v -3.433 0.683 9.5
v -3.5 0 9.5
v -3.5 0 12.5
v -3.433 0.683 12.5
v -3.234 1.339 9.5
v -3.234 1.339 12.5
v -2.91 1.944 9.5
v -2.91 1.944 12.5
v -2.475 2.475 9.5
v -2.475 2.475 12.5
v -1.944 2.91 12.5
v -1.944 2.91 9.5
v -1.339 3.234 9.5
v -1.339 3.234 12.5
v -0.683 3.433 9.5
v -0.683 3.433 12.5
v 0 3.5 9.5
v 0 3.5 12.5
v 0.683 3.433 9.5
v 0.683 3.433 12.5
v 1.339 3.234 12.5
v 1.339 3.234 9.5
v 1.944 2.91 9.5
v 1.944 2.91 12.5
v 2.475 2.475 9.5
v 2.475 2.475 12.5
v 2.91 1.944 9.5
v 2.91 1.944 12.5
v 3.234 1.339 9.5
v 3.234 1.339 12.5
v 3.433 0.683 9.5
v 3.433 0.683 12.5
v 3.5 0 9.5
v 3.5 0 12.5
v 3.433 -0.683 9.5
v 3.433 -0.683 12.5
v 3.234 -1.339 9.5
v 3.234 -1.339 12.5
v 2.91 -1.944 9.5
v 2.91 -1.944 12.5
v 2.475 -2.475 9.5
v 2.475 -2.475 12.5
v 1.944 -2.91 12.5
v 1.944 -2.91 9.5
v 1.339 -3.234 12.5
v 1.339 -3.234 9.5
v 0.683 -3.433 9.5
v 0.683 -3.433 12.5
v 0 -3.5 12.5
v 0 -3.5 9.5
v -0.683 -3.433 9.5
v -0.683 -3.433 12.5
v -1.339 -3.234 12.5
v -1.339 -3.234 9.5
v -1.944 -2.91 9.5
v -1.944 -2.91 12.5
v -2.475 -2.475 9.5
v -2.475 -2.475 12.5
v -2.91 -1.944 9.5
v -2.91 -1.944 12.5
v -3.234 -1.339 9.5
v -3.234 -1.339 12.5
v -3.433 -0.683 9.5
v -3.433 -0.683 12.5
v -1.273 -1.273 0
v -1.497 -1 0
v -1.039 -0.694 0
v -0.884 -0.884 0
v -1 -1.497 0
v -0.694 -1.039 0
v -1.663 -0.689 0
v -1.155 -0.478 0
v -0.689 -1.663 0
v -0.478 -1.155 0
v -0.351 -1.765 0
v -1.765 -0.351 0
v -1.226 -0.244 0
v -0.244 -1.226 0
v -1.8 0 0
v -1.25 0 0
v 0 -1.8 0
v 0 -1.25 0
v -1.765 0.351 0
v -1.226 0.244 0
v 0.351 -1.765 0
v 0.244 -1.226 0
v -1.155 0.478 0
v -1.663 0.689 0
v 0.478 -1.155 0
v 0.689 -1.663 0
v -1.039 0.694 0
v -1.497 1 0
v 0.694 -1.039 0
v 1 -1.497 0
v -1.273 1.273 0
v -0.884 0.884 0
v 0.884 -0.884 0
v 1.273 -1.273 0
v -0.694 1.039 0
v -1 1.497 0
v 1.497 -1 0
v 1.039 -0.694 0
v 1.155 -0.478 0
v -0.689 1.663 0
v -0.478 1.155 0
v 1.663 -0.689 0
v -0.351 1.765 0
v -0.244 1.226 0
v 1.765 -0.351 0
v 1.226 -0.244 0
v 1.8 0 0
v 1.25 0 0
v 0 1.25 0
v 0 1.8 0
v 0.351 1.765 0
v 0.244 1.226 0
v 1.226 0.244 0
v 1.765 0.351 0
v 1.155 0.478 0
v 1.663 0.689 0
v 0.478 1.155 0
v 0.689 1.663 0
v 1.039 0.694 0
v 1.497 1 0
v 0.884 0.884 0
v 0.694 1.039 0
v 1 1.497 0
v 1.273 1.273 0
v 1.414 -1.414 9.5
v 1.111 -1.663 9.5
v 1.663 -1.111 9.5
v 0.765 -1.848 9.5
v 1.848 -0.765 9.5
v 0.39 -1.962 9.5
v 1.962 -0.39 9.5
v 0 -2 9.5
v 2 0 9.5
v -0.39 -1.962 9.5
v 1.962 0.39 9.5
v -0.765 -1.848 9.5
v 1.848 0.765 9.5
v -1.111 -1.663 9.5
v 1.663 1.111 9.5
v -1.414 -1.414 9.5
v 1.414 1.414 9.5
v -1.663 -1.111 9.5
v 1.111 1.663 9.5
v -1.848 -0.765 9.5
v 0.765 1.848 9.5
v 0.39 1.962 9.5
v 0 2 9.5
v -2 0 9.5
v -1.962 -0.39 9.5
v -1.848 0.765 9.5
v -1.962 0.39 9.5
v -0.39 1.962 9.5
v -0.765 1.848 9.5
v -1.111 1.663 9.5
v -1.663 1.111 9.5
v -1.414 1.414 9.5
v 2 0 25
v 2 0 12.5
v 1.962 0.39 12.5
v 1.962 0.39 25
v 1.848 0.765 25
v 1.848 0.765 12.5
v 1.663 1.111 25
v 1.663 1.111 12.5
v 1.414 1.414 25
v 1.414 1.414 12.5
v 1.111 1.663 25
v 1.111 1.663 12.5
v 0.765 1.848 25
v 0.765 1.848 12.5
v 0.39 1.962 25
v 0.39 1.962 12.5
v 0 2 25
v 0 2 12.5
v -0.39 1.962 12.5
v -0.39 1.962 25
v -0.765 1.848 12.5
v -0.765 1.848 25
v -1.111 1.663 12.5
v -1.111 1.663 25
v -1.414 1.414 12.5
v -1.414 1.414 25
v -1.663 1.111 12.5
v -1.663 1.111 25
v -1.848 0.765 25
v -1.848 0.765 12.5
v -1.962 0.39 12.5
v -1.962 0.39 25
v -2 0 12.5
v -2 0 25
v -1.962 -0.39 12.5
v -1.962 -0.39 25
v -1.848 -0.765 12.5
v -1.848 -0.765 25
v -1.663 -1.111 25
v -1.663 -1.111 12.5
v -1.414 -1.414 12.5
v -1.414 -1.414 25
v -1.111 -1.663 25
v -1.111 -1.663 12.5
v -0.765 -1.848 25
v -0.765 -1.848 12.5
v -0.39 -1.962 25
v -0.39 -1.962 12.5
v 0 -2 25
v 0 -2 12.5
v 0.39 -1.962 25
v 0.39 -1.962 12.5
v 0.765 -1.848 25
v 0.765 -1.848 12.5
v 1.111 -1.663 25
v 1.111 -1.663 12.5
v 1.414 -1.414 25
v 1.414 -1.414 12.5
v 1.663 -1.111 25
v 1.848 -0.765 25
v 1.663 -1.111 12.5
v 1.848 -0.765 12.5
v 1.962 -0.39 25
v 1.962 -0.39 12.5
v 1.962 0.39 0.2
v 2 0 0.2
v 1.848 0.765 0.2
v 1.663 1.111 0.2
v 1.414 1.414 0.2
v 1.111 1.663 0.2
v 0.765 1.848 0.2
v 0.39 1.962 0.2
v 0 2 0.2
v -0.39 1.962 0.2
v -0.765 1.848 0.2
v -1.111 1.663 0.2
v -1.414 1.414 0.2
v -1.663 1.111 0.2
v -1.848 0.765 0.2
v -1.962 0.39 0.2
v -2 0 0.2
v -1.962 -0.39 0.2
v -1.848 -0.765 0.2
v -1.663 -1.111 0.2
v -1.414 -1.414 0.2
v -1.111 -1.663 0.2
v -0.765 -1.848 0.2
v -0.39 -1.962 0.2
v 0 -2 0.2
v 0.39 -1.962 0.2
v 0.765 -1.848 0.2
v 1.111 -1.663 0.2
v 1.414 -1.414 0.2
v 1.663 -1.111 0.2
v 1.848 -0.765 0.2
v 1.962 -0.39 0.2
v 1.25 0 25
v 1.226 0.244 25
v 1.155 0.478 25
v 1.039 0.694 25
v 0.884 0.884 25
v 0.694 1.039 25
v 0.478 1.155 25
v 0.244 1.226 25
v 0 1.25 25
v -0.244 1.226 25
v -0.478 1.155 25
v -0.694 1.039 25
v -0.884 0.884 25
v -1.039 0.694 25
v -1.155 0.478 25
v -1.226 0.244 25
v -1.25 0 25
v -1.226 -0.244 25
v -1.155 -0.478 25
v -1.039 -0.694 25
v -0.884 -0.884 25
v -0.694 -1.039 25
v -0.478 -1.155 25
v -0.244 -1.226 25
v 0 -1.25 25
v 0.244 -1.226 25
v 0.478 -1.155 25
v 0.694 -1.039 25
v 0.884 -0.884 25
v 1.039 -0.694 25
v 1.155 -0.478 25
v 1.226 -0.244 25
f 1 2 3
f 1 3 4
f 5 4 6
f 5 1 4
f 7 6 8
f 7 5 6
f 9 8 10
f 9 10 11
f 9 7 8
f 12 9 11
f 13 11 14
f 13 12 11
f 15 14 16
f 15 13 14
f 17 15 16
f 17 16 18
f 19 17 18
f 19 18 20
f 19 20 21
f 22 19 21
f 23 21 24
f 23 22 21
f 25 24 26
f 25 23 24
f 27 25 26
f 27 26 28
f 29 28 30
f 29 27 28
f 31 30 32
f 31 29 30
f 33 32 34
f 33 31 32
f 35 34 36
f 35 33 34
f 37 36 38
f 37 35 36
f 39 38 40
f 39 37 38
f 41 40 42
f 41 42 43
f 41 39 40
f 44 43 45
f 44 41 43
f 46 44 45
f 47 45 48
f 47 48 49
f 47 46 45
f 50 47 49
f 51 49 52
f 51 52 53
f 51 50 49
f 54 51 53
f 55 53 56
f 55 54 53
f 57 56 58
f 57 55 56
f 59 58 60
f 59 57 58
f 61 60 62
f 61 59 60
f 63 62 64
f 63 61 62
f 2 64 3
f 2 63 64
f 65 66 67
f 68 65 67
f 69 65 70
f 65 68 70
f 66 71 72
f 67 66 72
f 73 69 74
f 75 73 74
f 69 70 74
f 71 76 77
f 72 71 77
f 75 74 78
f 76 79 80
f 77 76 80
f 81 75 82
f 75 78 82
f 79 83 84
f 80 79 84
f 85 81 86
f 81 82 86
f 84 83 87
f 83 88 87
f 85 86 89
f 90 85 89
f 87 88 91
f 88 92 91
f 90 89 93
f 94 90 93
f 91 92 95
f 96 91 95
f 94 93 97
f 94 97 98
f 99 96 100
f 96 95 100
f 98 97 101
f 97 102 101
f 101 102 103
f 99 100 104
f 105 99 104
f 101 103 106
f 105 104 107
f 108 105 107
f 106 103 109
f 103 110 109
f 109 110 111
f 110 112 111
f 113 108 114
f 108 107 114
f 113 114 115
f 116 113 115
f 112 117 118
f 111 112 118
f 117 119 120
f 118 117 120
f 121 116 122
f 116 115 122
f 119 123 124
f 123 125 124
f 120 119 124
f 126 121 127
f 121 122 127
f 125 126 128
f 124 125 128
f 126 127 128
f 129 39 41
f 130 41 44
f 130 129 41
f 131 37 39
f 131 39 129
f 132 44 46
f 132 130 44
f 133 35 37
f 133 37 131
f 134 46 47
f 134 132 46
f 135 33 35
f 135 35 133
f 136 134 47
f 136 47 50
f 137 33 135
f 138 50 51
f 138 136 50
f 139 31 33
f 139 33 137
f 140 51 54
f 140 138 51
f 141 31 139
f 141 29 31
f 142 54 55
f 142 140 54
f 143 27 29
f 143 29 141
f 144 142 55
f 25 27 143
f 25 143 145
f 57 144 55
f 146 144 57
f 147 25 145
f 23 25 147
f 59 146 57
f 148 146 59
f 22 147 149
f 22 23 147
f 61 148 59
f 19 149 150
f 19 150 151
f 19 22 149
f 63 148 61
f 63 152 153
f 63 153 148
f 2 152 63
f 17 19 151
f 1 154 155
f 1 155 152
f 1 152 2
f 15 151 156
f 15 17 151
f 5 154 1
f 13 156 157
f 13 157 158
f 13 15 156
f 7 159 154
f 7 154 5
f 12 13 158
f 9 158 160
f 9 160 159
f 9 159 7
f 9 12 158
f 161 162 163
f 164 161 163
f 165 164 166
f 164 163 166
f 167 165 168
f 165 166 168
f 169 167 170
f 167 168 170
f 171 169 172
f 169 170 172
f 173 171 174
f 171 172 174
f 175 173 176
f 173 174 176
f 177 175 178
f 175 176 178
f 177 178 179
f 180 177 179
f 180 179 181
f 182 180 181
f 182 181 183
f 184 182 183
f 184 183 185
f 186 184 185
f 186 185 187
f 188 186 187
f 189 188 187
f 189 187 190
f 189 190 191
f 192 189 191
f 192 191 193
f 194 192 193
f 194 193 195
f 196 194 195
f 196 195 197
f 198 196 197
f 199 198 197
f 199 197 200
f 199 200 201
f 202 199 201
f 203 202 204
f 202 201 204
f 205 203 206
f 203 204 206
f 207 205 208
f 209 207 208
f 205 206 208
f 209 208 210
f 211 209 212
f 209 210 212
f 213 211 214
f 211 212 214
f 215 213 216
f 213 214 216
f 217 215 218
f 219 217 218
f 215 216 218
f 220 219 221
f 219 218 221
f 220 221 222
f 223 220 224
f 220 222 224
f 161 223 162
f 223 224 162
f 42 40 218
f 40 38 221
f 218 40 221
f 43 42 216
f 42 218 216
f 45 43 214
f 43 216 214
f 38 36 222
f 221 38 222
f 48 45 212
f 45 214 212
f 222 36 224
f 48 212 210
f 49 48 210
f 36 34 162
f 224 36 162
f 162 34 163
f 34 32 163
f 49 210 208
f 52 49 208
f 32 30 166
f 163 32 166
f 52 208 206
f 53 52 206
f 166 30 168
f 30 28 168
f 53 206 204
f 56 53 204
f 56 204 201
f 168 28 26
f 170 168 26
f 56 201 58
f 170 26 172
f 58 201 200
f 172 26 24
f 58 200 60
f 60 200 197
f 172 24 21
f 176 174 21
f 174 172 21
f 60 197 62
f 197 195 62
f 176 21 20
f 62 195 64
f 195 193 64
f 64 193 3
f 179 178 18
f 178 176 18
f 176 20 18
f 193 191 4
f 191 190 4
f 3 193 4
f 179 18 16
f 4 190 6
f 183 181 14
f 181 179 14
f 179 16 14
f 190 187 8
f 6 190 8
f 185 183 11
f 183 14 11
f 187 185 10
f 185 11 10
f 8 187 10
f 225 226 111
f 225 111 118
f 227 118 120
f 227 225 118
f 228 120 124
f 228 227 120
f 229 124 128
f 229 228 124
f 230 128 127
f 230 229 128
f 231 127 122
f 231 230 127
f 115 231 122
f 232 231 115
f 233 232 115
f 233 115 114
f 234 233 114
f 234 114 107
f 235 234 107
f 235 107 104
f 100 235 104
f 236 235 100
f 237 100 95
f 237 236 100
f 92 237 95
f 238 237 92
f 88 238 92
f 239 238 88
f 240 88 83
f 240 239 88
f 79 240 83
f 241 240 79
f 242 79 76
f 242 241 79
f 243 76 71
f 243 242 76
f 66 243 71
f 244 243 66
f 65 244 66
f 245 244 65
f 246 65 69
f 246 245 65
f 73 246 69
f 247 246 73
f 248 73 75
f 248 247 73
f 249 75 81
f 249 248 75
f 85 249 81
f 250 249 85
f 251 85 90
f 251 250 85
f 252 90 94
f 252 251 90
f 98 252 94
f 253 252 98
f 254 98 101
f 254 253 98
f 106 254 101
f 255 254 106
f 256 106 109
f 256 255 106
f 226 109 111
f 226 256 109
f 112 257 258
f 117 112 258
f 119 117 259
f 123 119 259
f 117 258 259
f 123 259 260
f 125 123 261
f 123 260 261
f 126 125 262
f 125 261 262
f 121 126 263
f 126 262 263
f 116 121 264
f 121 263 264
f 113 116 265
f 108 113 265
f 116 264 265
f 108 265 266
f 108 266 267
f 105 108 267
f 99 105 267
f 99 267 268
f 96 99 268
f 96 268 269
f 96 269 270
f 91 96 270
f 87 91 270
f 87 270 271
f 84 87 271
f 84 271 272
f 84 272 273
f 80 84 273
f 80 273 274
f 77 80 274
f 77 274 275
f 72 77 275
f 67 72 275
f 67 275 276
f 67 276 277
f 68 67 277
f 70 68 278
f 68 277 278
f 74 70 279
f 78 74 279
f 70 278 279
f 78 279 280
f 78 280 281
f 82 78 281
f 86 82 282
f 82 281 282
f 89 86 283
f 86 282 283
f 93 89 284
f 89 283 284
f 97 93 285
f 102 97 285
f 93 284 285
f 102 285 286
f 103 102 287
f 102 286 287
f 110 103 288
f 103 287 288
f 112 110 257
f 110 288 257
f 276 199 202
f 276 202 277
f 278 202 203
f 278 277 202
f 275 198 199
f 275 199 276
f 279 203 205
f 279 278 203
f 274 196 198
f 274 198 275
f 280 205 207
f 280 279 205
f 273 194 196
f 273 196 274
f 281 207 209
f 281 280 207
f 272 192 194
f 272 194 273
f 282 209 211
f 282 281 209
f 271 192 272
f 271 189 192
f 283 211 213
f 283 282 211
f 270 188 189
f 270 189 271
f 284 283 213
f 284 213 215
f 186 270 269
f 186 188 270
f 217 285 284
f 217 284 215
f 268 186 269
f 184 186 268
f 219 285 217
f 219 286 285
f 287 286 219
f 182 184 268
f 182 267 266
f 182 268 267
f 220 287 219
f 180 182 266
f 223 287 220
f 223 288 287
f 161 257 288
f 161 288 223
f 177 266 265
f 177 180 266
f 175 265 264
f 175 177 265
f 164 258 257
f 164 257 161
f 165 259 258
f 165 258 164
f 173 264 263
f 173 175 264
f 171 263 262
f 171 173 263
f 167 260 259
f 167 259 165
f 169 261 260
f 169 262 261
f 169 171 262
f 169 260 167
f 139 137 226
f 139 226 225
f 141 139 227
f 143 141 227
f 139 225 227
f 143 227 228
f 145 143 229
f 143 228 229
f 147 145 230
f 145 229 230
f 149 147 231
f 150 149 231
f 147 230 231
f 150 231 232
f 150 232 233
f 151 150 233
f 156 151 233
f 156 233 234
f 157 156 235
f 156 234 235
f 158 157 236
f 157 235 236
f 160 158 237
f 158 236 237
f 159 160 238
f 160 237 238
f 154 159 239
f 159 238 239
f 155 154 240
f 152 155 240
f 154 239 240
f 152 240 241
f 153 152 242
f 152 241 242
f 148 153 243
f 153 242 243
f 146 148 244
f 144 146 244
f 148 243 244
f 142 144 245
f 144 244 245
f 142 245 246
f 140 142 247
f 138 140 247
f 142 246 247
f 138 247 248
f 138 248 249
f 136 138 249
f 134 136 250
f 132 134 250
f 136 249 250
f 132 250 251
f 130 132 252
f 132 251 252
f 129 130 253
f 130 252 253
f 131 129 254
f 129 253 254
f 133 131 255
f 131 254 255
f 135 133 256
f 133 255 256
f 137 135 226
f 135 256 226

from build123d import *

# Parameters (mm, degrees)
SKETCH_1_R          = 2
EXTRUDE_1_DEPTH     = 25
SKETCH_2_R          = 1.25
CUT_EXTRUDE_1_DEPTH = 26
EXTRUDE_START       = -9.5
SKETCH_3_R          = 3.5
SKETCH_3_R_2        = 2
EXTRUDE_2_DEPTH     = 3
CHAMFER_1_SIZE      = 0.2


with BuildPart() as part:
    # Эскиз1 → Бобышка-Вытянуть1 (new body)
    with BuildSketch(Plane.XY):
        Circle(SKETCH_1_R)
    extrude(amount=EXTRUDE_1_DEPTH)

    # Эскиз2 → Вырез-Вытянуть1 (cut, through all)
    with BuildSketch(Plane.XY.offset(25)):
        Circle(SKETCH_2_R)
    extrude(amount=-CUT_EXTRUDE_1_DEPTH, mode=Mode.SUBTRACT)

    # Эскиз3 → Бобышка-Вытянуть2 (add)
    with BuildSketch(Plane(origin=(0, 0, 0), x_dir=(-1, 0, 0), z_dir=(0, 0, -1)).offset(EXTRUDE_START)):
        Circle(SKETCH_3_R)
        Circle(SKETCH_3_R_2, mode=Mode.SUBTRACT)
    extrude(amount=-EXTRUDE_2_DEPTH)

    # Фаска1
    chamfer_1_edges = [part.edges().sort_by_distance(p)[0] for p in [
        (-2, 0, 0),
    ]]
    chamfer(chamfer_1_edges, length=CHAMFER_1_SIZE)


solid = part.part
